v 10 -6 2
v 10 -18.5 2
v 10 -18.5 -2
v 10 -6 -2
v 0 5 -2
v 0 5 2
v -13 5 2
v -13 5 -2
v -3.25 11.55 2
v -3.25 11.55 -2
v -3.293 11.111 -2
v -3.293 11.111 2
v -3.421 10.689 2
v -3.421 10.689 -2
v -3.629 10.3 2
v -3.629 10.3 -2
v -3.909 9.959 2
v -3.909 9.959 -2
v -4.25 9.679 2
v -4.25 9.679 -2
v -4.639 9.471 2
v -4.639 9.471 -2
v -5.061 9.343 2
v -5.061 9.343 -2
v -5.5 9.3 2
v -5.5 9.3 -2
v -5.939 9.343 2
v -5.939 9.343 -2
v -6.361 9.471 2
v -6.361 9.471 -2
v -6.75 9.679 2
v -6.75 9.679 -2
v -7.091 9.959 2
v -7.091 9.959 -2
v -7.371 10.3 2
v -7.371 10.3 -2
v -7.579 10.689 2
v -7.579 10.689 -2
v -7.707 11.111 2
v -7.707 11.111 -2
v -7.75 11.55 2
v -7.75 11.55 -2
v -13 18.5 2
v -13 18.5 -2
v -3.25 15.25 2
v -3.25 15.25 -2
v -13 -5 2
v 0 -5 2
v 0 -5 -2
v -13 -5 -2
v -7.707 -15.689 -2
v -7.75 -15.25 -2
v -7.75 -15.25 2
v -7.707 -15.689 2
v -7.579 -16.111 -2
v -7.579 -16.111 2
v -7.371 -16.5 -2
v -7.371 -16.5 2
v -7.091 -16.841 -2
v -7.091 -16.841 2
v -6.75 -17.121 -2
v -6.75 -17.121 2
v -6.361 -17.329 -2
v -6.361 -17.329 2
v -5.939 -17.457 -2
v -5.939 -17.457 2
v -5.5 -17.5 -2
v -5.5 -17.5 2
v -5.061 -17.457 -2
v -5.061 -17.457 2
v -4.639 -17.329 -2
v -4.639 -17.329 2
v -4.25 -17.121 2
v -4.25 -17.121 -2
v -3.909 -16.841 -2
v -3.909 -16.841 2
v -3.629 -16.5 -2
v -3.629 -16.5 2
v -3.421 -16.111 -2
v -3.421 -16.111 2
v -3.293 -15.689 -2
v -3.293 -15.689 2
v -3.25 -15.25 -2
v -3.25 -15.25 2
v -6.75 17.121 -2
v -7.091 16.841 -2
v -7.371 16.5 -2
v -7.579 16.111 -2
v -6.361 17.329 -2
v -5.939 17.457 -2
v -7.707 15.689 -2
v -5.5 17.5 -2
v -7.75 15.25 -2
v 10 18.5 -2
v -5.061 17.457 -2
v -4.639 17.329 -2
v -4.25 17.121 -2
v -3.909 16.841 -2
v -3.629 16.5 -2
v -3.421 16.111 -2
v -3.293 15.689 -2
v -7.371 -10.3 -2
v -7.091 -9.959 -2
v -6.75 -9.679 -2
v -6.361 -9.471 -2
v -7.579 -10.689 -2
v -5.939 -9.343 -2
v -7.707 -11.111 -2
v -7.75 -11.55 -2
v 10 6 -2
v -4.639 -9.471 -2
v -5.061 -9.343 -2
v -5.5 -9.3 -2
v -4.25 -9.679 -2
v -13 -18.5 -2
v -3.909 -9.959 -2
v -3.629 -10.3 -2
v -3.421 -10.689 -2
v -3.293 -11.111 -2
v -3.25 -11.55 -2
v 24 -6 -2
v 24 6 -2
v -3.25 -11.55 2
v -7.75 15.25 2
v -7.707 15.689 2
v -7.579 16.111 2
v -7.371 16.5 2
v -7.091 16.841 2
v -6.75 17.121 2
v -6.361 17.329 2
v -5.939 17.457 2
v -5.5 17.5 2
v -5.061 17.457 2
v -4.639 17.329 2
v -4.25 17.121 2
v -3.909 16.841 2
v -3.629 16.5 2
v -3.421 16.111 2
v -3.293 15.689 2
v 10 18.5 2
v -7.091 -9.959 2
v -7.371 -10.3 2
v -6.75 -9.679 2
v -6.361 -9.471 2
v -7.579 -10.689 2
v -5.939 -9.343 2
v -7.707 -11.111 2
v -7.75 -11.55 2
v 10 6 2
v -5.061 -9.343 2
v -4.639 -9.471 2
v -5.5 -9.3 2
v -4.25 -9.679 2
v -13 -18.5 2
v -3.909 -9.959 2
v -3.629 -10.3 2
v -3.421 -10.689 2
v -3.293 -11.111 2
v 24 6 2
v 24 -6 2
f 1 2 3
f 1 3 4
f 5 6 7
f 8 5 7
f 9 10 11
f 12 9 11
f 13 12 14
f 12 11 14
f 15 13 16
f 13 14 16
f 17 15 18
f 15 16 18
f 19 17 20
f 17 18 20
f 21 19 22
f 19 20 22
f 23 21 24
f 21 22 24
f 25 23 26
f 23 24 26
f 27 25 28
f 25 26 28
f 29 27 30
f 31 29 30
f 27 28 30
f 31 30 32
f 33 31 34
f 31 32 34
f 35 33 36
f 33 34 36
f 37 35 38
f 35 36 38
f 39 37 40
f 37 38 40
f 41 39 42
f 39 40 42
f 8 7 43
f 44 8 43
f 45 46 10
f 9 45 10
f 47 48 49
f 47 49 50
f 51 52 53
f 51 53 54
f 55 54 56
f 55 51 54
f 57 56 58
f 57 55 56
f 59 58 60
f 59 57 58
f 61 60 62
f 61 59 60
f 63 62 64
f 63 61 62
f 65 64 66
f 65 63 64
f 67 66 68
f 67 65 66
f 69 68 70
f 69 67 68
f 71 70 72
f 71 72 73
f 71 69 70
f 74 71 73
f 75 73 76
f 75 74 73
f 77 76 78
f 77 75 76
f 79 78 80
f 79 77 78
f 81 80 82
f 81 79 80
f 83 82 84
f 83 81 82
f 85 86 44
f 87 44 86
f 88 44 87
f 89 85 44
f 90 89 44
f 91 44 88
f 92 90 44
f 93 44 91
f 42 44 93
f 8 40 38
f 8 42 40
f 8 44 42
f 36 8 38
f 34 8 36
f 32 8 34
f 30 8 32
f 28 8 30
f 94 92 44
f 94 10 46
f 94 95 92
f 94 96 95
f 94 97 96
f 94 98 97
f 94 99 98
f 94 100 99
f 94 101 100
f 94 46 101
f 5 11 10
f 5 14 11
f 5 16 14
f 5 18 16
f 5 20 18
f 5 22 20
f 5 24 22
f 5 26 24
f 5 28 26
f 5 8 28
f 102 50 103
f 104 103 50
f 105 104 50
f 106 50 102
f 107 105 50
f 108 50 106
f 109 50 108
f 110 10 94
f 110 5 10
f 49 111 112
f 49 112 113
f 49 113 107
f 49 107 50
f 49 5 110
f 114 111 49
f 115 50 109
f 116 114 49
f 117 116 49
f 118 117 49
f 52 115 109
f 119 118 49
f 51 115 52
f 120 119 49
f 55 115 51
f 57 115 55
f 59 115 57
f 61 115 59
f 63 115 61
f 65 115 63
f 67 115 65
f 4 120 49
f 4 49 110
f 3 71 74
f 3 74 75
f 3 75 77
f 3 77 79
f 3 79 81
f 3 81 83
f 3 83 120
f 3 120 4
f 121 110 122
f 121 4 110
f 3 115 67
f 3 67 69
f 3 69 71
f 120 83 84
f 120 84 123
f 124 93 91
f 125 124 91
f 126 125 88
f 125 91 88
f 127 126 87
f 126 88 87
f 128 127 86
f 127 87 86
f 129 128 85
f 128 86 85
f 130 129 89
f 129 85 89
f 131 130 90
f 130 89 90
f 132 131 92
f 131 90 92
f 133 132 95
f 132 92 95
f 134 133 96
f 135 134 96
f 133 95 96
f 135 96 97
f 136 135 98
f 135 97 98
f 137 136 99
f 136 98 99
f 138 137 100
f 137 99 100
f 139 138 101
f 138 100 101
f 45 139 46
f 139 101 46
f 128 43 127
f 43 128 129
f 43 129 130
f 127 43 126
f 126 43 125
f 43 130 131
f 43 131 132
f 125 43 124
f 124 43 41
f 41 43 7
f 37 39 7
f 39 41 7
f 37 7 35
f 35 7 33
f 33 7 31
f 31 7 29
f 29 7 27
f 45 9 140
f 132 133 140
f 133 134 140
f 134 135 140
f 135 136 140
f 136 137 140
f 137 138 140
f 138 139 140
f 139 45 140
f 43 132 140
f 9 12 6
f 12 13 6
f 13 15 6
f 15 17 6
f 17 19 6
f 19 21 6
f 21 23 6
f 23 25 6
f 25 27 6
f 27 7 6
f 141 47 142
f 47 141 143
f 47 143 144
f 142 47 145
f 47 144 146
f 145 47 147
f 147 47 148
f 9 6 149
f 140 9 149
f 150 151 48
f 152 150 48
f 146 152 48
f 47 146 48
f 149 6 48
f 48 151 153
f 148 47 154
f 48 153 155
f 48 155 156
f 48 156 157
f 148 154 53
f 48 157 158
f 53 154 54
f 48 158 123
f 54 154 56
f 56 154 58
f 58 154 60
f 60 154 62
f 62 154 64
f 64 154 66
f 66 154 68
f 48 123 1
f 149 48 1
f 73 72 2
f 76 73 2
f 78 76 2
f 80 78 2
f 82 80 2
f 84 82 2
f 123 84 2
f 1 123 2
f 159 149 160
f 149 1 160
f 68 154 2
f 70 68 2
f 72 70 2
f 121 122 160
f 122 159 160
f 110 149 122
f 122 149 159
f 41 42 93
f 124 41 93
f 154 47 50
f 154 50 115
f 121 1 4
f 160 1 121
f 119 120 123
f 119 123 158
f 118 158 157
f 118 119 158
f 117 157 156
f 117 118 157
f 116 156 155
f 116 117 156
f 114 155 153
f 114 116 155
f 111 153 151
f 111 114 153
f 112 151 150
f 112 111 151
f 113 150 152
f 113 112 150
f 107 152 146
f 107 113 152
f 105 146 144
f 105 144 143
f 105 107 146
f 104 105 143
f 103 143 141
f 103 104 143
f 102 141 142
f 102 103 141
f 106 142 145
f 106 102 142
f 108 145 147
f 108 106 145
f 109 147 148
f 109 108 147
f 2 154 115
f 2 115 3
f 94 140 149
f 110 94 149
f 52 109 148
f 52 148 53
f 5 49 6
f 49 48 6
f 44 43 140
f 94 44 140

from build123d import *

# Parameters (mm, degrees)
BOSS_EXTRUDE1_DEPTH      = 2
M4_START                 = -2
M4_CLEARANCE_SLOT1_DEPTH = 4


# Read off the part's stored shape, not the designer's step: M4 Clearance Slot1
with BuildPart() as part:
    # Sketch1 → Boss-Extrude1 (new, symmetric)
    with BuildSketch(Plane.XY):
        Polygon((0, 0), (0, -5), (-13, -5), (-13, -18.5), (10, -18.5), (10, -6), (24, -6), (24, 0), align=None)
    boss_extrude1 = extrude(amount=BOSS_EXTRUDE1_DEPTH, both=True)

    # M4 Clearance Slot1 outline → M4 Clearance Slot1 (cut)
    with BuildSketch(Plane.XY.offset(M4_START)):
        with BuildLine():
            Line((-7.75, -11.55), (-7.75, -15.25))
            ThreePointArc((-7.75, -15.25), (-5.5, -17.5), (-3.25, -15.25))
            Line((-3.25, -15.25), (-3.25, -11.55))
            ThreePointArc((-3.25, -11.55), (-5.5, -9.3), (-7.75, -11.55))
        make_face()
    m4_clearance_slot1 = extrude(amount=M4_CLEARANCE_SLOT1_DEPTH, mode=Mode.SUBTRACT)

    # Mirror2: Boss-Extrude1, M4 Clearance Slot1 across plane
    add(boss_extrude1.mirror(Plane.ZX))
    add(m4_clearance_slot1.mirror(Plane.ZX), mode=Mode.SUBTRACT)


solid = part.part
